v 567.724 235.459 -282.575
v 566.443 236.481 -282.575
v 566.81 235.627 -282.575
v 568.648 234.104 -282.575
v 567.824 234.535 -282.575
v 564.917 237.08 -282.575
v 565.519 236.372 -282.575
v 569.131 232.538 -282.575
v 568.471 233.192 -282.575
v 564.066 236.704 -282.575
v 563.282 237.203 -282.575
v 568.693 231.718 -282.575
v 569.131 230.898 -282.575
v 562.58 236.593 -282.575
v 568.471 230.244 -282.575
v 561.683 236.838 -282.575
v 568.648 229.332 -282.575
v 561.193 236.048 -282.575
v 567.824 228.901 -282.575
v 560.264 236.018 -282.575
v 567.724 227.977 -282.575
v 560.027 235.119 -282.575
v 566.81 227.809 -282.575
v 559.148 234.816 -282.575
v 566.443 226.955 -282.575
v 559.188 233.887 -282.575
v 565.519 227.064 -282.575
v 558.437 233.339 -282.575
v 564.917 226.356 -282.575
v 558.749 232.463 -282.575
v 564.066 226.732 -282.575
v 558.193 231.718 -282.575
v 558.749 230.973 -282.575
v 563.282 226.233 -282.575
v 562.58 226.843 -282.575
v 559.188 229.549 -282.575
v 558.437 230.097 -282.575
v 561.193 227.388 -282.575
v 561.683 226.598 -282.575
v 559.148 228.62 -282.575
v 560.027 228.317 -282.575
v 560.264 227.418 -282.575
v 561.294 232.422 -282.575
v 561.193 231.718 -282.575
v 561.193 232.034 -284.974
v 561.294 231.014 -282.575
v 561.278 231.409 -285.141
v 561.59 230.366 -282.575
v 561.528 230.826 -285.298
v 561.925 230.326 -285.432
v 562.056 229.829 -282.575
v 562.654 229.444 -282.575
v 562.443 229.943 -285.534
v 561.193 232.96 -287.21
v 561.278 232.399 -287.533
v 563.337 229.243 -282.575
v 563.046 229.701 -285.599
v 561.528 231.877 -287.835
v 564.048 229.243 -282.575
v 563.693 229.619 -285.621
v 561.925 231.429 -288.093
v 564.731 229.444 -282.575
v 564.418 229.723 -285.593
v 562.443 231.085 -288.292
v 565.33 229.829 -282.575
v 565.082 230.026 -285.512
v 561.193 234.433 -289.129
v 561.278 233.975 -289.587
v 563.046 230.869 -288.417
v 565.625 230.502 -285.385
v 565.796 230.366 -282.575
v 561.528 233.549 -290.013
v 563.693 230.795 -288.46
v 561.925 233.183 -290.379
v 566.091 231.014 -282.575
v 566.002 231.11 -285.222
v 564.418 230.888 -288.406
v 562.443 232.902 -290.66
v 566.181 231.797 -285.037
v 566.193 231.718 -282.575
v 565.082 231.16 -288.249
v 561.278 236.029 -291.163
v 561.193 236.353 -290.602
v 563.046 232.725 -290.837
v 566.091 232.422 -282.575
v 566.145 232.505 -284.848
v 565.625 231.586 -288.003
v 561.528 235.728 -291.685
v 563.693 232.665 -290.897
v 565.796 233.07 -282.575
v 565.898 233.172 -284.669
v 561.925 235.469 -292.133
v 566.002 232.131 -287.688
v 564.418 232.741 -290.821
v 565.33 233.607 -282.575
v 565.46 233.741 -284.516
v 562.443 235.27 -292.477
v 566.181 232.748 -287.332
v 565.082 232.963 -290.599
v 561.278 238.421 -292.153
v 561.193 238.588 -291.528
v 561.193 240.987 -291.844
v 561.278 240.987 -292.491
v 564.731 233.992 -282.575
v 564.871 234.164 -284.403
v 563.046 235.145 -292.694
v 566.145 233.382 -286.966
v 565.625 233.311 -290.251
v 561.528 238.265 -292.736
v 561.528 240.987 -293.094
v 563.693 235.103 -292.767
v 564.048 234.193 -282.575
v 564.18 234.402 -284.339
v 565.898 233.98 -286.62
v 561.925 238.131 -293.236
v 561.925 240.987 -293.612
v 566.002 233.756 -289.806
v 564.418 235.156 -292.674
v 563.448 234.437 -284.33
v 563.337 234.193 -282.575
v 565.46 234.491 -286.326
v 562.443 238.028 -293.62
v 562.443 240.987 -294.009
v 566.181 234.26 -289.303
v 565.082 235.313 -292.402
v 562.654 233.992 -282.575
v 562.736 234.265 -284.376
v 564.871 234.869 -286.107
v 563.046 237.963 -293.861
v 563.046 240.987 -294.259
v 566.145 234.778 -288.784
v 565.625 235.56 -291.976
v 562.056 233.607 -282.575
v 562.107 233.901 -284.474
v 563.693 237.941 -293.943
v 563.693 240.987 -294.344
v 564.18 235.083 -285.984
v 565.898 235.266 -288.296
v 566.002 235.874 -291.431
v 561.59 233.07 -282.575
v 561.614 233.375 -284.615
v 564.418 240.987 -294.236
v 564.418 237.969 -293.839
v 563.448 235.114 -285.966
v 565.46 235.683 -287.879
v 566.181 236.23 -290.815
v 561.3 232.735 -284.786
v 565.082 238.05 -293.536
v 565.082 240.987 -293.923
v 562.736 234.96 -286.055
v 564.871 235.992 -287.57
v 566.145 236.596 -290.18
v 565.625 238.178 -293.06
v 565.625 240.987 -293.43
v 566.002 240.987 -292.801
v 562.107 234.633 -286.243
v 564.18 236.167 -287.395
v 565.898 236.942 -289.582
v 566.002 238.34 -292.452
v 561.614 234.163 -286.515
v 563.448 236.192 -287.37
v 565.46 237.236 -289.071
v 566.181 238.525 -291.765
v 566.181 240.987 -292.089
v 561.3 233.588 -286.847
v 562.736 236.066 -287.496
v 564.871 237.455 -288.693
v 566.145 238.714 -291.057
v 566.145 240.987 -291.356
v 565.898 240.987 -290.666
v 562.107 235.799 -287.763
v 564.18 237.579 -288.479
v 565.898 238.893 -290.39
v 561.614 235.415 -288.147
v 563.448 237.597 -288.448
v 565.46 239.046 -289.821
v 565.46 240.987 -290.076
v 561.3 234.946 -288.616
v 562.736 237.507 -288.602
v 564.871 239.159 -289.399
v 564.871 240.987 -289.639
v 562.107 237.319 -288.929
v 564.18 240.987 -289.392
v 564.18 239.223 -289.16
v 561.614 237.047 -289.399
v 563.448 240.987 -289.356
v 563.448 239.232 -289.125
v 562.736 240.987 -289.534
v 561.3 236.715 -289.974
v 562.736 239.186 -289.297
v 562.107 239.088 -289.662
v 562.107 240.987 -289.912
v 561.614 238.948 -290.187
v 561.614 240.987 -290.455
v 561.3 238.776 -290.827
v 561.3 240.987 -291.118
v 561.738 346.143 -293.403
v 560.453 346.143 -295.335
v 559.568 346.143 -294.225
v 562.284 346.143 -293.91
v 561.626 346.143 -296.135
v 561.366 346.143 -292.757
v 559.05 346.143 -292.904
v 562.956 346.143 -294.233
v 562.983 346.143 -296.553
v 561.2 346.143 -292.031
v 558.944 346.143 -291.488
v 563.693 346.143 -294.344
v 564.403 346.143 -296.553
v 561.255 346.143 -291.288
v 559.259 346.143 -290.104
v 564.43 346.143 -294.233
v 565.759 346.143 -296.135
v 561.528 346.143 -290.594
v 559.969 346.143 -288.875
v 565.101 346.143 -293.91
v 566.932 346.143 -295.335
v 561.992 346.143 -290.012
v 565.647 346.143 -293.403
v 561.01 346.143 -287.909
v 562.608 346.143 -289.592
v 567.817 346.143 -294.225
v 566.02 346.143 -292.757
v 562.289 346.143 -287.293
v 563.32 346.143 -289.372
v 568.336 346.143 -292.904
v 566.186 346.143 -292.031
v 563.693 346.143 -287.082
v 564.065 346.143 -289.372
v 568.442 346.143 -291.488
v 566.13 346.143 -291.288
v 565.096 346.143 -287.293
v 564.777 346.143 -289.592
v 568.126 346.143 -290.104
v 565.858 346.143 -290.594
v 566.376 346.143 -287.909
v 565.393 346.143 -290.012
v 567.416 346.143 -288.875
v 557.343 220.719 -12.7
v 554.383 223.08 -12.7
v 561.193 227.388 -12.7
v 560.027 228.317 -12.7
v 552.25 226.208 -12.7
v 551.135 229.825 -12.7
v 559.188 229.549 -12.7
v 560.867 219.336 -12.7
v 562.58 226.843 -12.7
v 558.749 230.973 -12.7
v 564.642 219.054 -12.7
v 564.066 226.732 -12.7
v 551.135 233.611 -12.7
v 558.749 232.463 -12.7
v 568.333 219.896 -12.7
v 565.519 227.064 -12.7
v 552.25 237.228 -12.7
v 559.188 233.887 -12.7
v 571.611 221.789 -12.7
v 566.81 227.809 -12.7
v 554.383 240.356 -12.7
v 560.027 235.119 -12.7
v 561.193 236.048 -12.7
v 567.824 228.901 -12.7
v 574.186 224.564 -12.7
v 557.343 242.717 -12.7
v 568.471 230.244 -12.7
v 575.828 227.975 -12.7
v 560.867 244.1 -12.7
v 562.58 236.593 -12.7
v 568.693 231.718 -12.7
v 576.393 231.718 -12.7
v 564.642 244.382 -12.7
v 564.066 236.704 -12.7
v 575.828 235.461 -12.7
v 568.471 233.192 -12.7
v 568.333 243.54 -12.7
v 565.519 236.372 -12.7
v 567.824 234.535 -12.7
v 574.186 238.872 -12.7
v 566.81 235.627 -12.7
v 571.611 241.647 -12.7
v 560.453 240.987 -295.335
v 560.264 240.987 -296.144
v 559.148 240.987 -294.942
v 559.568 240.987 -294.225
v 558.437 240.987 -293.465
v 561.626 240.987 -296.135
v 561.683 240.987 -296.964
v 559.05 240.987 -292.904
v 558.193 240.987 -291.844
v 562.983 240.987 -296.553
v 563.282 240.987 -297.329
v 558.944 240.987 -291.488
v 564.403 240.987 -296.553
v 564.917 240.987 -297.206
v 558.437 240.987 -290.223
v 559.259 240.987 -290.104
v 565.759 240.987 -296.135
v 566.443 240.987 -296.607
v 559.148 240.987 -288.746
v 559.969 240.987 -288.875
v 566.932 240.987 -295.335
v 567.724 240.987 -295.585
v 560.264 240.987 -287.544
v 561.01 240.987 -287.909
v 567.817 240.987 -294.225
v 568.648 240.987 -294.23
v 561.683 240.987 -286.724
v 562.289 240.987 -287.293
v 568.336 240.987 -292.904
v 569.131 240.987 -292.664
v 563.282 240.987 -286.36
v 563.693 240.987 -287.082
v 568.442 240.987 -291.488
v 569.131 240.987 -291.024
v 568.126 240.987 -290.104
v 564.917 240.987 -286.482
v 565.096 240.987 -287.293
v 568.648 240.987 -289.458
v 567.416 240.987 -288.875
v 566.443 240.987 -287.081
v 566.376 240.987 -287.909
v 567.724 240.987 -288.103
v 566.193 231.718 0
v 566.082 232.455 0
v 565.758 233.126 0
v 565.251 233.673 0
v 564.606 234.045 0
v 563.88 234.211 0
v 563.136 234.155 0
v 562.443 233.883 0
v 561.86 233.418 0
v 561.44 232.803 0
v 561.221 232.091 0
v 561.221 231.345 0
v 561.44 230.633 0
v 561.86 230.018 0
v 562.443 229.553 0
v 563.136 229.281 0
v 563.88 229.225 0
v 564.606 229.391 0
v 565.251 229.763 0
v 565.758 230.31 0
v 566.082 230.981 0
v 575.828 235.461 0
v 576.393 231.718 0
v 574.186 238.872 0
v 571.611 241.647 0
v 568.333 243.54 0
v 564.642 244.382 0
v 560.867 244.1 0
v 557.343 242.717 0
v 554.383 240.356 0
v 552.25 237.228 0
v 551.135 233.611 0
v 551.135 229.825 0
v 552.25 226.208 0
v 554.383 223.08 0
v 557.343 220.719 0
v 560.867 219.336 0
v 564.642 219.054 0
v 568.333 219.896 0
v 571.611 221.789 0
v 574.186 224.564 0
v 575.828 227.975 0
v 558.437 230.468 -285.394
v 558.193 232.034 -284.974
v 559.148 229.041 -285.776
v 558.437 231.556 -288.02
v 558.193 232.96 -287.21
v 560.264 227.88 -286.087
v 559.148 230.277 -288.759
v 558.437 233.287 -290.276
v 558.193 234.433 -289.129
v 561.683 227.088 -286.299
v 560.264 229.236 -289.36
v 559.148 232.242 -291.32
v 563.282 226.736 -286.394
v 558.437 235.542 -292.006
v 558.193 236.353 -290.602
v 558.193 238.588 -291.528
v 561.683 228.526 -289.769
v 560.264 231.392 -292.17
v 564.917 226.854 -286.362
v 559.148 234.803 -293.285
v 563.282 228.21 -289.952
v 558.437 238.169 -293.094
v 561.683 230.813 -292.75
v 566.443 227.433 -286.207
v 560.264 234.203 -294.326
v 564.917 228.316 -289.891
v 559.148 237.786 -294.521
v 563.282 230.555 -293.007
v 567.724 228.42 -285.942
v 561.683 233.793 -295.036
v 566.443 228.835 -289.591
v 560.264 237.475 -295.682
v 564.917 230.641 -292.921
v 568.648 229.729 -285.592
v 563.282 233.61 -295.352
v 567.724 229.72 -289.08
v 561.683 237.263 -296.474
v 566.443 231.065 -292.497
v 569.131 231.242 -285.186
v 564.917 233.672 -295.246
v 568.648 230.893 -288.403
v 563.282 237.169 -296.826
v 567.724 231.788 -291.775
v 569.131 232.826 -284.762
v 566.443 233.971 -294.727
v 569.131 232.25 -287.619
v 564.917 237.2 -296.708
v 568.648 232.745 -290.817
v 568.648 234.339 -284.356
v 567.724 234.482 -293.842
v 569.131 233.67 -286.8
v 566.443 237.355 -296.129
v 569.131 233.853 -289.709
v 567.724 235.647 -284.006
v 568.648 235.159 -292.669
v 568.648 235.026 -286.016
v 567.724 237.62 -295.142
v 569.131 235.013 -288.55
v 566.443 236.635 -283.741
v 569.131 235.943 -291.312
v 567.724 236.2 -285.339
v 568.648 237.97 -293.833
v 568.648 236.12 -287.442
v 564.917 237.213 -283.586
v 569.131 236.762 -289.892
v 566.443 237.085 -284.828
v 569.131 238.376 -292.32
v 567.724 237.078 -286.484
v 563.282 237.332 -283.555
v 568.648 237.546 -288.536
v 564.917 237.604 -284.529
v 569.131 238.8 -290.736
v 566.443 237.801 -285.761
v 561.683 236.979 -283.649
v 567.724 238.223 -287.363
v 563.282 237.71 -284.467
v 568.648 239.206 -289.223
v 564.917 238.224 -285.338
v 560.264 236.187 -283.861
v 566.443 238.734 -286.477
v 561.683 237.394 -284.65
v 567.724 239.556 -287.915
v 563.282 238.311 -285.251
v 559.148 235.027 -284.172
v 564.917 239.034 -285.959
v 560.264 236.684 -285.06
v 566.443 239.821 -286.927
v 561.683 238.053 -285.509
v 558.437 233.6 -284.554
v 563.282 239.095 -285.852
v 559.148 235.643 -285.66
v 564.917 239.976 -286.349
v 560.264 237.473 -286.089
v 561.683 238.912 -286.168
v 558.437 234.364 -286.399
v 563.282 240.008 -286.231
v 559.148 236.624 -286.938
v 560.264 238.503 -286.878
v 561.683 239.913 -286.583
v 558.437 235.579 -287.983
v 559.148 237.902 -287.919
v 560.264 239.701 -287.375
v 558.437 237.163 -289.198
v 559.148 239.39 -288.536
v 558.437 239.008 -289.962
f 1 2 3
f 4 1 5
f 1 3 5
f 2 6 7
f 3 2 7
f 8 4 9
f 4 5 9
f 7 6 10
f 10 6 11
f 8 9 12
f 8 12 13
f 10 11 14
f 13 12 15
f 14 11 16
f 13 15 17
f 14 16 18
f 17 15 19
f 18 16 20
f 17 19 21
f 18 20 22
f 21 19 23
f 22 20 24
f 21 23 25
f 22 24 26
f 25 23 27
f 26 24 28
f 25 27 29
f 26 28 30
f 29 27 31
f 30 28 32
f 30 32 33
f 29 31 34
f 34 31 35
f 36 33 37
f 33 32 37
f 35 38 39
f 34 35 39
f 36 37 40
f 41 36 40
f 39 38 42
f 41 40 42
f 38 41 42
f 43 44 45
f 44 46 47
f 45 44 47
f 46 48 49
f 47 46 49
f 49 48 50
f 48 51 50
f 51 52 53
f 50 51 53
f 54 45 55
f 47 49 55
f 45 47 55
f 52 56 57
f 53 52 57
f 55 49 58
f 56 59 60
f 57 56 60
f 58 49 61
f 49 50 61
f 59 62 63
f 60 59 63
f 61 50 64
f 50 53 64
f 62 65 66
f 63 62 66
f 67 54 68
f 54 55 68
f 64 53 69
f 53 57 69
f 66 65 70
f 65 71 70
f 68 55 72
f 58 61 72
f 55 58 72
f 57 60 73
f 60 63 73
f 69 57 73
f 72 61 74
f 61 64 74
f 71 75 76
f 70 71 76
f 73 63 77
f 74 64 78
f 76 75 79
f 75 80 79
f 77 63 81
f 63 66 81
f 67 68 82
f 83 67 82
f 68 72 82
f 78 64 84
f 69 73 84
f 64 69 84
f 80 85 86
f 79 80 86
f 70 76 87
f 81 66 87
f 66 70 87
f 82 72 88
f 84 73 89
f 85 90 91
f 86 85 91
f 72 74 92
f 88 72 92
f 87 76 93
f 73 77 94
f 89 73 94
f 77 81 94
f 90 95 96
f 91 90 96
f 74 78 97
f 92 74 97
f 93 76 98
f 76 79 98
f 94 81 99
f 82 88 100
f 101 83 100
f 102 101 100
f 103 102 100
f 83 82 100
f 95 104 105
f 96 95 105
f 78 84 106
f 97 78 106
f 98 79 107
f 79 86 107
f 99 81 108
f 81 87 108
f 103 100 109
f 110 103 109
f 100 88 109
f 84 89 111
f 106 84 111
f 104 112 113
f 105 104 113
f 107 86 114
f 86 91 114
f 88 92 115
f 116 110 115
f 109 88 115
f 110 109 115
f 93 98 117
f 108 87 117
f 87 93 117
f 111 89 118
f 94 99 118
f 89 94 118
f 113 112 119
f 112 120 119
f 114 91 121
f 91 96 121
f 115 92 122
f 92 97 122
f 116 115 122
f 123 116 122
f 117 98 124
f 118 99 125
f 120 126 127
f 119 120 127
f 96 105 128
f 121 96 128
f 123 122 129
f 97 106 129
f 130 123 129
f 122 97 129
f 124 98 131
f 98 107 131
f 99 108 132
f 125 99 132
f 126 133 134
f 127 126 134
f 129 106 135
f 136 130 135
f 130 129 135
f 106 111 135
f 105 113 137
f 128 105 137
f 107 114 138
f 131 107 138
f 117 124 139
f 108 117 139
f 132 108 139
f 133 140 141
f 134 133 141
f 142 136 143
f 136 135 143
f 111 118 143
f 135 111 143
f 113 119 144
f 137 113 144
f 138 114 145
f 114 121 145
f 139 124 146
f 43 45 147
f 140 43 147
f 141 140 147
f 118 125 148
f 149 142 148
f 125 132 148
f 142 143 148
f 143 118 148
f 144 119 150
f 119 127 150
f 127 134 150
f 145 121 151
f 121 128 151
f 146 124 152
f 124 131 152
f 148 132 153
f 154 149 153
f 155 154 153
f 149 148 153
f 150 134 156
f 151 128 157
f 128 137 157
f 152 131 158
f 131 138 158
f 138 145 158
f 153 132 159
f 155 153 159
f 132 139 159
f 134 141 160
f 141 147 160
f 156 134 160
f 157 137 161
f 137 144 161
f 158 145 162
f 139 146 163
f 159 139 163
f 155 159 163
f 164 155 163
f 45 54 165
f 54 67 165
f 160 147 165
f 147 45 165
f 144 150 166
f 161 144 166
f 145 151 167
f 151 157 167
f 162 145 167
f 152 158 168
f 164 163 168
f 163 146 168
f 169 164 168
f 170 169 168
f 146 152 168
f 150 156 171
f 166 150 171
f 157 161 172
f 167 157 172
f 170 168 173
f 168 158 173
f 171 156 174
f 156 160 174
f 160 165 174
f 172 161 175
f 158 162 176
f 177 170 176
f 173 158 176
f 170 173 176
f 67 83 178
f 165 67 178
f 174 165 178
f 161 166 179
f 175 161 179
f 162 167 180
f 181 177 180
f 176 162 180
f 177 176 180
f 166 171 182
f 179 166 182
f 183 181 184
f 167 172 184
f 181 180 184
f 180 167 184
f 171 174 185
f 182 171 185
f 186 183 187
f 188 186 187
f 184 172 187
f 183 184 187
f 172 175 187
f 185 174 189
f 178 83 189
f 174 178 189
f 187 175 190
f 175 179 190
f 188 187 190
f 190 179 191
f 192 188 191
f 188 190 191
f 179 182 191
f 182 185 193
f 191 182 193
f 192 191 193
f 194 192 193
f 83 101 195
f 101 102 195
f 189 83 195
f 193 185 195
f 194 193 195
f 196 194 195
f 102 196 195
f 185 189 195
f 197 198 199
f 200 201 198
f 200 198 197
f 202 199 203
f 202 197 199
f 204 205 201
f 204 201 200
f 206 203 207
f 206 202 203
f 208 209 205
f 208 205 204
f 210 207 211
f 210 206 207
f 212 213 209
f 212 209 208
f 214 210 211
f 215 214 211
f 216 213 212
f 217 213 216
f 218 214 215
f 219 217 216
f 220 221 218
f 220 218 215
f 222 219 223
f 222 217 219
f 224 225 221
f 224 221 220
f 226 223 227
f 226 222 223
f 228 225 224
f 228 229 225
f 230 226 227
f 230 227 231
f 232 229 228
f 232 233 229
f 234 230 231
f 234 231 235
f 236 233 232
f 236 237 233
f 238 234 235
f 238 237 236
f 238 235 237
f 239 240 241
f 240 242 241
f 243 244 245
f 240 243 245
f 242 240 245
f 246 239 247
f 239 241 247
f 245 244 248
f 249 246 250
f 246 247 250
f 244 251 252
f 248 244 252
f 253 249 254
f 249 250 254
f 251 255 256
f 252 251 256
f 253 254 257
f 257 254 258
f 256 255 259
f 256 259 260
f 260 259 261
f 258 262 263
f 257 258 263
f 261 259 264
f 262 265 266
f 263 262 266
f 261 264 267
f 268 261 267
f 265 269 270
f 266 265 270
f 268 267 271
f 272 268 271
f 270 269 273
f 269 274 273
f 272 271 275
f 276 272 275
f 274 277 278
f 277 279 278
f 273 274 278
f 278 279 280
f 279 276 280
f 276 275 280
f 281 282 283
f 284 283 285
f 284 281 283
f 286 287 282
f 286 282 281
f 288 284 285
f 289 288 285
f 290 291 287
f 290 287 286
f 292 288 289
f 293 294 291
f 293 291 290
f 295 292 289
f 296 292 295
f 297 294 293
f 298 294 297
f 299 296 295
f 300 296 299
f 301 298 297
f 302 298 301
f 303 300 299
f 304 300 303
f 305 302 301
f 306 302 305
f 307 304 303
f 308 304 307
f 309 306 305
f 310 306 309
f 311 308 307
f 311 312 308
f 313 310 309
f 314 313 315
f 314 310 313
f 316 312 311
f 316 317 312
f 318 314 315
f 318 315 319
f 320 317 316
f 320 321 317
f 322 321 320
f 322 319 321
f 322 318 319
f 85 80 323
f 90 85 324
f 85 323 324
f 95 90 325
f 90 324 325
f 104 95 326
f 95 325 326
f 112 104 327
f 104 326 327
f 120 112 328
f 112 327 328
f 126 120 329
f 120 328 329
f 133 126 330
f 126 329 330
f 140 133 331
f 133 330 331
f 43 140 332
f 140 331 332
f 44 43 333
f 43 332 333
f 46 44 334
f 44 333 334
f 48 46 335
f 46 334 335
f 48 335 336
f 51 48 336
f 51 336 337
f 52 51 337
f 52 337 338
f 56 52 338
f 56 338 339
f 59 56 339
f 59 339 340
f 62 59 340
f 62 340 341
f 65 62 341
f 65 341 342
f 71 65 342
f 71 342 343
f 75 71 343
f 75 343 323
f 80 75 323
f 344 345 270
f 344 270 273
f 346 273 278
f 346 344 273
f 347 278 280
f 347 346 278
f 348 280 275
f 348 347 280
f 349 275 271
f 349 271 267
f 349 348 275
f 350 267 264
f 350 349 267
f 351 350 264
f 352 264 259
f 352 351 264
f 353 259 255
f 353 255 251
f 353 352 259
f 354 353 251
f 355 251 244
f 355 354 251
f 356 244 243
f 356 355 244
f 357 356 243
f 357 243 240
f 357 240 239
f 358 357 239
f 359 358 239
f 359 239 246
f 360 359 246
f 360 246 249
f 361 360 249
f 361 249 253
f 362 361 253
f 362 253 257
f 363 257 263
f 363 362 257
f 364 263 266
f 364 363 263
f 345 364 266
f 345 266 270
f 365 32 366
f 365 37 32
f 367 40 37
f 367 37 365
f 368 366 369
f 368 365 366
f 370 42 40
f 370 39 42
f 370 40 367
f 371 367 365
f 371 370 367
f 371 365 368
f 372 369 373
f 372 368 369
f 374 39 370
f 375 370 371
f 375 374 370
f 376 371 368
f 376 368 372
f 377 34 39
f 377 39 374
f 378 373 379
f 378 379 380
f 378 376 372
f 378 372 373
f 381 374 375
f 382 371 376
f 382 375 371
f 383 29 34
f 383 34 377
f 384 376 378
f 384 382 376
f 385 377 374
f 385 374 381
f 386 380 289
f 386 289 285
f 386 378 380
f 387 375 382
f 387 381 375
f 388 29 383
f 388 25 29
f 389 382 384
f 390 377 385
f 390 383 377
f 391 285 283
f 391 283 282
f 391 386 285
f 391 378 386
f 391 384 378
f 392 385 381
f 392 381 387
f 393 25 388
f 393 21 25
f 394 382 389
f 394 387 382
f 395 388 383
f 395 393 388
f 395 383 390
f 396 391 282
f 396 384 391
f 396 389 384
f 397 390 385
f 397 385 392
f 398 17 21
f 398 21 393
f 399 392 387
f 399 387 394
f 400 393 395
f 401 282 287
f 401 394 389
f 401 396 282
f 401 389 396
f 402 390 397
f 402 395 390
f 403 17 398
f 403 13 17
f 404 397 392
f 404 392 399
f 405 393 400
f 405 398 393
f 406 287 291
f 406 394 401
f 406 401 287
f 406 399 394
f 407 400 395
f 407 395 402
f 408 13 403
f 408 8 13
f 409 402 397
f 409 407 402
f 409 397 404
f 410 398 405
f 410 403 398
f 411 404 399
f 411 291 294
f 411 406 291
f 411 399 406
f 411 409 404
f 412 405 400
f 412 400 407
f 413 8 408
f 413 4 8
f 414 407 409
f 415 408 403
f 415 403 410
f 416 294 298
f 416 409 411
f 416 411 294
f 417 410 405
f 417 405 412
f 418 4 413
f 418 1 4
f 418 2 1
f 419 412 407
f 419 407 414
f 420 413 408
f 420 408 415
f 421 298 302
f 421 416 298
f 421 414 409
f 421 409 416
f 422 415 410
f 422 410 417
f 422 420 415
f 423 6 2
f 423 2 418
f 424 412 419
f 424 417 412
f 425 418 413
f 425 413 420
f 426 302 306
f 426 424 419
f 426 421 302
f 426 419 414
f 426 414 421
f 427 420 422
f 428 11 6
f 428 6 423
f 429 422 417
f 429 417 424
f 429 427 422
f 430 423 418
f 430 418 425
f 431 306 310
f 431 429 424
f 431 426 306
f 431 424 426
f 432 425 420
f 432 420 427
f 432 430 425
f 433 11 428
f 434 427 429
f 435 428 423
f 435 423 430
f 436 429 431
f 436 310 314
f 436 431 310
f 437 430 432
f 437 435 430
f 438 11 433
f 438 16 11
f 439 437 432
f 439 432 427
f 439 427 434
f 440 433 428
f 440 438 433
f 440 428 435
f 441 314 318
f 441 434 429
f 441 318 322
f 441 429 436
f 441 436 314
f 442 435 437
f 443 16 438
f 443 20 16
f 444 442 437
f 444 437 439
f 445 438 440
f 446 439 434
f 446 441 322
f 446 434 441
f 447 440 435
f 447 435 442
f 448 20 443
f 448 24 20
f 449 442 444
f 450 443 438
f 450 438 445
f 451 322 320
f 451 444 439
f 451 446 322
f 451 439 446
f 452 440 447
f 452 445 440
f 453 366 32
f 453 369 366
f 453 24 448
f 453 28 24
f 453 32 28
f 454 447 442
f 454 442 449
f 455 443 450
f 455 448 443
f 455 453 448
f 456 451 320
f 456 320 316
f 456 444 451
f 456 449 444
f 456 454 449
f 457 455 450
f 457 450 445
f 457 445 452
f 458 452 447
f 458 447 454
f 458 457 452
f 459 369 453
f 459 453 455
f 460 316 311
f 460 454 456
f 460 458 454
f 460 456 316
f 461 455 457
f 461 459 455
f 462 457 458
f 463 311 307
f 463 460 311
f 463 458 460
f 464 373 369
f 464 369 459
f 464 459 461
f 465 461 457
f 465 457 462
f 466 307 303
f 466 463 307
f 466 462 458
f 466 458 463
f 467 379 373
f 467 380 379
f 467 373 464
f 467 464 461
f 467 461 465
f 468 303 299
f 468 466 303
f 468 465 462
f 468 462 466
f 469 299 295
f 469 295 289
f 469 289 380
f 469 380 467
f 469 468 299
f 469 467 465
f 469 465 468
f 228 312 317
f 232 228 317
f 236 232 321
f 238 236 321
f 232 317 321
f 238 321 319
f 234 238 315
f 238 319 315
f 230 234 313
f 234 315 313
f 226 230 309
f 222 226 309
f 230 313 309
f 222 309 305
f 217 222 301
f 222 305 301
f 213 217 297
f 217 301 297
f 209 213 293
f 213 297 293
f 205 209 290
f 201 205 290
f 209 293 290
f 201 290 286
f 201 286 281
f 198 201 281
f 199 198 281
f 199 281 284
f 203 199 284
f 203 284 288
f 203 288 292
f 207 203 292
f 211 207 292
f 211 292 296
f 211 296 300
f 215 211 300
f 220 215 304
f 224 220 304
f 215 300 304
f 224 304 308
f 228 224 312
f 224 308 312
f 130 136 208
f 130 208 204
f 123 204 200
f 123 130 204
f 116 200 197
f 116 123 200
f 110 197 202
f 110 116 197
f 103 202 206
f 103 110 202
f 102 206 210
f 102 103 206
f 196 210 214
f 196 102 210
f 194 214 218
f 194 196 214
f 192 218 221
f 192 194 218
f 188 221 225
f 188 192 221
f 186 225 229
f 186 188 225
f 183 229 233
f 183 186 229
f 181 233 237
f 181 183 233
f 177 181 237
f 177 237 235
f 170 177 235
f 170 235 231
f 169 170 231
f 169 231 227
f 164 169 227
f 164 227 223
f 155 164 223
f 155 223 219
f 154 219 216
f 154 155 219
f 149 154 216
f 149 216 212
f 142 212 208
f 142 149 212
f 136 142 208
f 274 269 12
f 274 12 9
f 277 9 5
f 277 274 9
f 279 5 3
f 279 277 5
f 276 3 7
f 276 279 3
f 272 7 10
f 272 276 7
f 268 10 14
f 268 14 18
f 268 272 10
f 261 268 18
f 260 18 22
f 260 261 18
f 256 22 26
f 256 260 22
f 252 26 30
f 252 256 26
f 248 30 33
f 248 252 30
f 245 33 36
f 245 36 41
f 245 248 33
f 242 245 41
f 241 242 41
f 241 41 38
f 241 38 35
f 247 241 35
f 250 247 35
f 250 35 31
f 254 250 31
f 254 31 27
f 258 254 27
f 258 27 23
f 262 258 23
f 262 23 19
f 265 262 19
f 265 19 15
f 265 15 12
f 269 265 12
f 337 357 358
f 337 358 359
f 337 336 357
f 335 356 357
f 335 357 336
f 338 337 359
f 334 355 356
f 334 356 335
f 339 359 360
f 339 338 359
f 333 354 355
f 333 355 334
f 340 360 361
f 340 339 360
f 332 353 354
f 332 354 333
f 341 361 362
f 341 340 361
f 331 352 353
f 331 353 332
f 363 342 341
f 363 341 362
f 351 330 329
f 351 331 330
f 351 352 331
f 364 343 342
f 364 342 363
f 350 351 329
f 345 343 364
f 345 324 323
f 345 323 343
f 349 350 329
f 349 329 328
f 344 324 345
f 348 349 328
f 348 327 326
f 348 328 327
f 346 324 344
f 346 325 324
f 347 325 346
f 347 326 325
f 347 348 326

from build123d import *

# Parameters (mm, degrees)
SKETCH1_R           = 12.7
SKETCH1_R_2         = 5
BASE_EXTRUDE_DEPTH  = 12.7
SKETCH2_R           = 5
SKETCH2_R_2         = 2.5
BOSS_EXTRUDE1_DEPTH = 282.575
SKETCH5_R           = 5.5
SKETCH5_R_2         = 2.5
SKETCH7_R           = 4.7625
SKETCH7_R_2         = 2.5
BOSS_EXTRUDE2_DEPTH = 105.156


with BuildPart() as part:
    # Sketch1 → Base-Extrude (new body)
    with BuildSketch(Plane.XY):
        with Locations((563.692704422, 231.718004299)):
            Circle(SKETCH1_R)
        with Locations((563.692704422, 231.718004299)):
            Circle(SKETCH1_R_2, mode=Mode.SUBTRACT)
    extrude(amount=-BASE_EXTRUDE_DEPTH)

    # Sketch2 → Boss-Extrude1 (add)
    with BuildSketch(Plane.XY):
        with Locations((563.692704422, 231.718004299)):
            Circle(SKETCH2_R)
        with Locations((563.692704422, 231.718004299)):
            Circle(SKETCH2_R_2, mode=Mode.SUBTRACT)
    extrude(amount=-BOSS_EXTRUDE1_DEPTH)

    # Boss-Sweep2: sweep along a path in Sketch6
    with BuildLine(Plane(origin=(563.692704422, 0, 0), x_dir=(0, 0, -1), z_dir=(1, 0, 0))) as boss_sweep2_path:
        ThreePointArc((282.575, 231.718004299), (289.129269744, 234.432871718), (291.844137163, 240.987141462))
    # Sketch5 → Boss-Sweep2 (sweep)
    with BuildSketch(Plane(origin=(0, 0, -282.575), x_dir=(-1, 0, 0), z_dir=(0, 0, -1))):
        with Locations((-563.692704422, 231.718004299)):
            Circle(SKETCH5_R)
        with Locations((-563.692704422, 231.718004299)):
            Circle(SKETCH5_R_2, mode=Mode.SUBTRACT)
    sweep(path=boss_sweep2_path.line)

    # Sketch7 → Boss-Extrude2 (add)
    with BuildSketch(Plane(origin=(0, 240.987141462, 0), x_dir=(-1, 0, 0), z_dir=(0, 1, 0))):
        with Locations(Location((-563.692704422, -291.844137163, 0), (0, 0, 90))):
            Circle(SKETCH7_R)
        with Locations(Location((-563.692704422, -291.844137163, 0), (0, 0, 270))):
            Circle(SKETCH7_R_2, mode=Mode.SUBTRACT)
    extrude(amount=BOSS_EXTRUDE2_DEPTH)


solid = part.part
